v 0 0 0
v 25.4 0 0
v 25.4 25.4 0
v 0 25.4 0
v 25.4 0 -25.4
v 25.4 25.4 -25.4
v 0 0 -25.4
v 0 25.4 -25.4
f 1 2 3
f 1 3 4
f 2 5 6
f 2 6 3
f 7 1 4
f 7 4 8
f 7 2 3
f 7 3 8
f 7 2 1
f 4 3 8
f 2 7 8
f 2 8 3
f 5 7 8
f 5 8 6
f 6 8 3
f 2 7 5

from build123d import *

# Parameters (mm, degrees)
EXTRUDE_1_DEPTH = 25.4
EXTRUDE_2_DEPTH = 25.4


with BuildPart() as part:
    # 草图1 → 凸台-拉伸1 (new body)
    with BuildSketch(Plane(origin=(0, 0, 0), x_dir=(1, 0, 0), z_dir=(0, 1, 0))):
        Polygon((0, 0), (0, 25.4), (25.4, 0), align=None)
    extrude(amount=EXTRUDE_1_DEPTH)


with BuildPart() as body_2:
    # 草图2 → 凸台-拉伸2 (new body)
    with BuildSketch(Plane.XZ):
        Polygon((0, -25.4), (25.4, -25.4), (25.4, 0), align=None)
    extrude(amount=-EXTRUDE_2_DEPTH)


solid = Compound([part.part, body_2.part])
